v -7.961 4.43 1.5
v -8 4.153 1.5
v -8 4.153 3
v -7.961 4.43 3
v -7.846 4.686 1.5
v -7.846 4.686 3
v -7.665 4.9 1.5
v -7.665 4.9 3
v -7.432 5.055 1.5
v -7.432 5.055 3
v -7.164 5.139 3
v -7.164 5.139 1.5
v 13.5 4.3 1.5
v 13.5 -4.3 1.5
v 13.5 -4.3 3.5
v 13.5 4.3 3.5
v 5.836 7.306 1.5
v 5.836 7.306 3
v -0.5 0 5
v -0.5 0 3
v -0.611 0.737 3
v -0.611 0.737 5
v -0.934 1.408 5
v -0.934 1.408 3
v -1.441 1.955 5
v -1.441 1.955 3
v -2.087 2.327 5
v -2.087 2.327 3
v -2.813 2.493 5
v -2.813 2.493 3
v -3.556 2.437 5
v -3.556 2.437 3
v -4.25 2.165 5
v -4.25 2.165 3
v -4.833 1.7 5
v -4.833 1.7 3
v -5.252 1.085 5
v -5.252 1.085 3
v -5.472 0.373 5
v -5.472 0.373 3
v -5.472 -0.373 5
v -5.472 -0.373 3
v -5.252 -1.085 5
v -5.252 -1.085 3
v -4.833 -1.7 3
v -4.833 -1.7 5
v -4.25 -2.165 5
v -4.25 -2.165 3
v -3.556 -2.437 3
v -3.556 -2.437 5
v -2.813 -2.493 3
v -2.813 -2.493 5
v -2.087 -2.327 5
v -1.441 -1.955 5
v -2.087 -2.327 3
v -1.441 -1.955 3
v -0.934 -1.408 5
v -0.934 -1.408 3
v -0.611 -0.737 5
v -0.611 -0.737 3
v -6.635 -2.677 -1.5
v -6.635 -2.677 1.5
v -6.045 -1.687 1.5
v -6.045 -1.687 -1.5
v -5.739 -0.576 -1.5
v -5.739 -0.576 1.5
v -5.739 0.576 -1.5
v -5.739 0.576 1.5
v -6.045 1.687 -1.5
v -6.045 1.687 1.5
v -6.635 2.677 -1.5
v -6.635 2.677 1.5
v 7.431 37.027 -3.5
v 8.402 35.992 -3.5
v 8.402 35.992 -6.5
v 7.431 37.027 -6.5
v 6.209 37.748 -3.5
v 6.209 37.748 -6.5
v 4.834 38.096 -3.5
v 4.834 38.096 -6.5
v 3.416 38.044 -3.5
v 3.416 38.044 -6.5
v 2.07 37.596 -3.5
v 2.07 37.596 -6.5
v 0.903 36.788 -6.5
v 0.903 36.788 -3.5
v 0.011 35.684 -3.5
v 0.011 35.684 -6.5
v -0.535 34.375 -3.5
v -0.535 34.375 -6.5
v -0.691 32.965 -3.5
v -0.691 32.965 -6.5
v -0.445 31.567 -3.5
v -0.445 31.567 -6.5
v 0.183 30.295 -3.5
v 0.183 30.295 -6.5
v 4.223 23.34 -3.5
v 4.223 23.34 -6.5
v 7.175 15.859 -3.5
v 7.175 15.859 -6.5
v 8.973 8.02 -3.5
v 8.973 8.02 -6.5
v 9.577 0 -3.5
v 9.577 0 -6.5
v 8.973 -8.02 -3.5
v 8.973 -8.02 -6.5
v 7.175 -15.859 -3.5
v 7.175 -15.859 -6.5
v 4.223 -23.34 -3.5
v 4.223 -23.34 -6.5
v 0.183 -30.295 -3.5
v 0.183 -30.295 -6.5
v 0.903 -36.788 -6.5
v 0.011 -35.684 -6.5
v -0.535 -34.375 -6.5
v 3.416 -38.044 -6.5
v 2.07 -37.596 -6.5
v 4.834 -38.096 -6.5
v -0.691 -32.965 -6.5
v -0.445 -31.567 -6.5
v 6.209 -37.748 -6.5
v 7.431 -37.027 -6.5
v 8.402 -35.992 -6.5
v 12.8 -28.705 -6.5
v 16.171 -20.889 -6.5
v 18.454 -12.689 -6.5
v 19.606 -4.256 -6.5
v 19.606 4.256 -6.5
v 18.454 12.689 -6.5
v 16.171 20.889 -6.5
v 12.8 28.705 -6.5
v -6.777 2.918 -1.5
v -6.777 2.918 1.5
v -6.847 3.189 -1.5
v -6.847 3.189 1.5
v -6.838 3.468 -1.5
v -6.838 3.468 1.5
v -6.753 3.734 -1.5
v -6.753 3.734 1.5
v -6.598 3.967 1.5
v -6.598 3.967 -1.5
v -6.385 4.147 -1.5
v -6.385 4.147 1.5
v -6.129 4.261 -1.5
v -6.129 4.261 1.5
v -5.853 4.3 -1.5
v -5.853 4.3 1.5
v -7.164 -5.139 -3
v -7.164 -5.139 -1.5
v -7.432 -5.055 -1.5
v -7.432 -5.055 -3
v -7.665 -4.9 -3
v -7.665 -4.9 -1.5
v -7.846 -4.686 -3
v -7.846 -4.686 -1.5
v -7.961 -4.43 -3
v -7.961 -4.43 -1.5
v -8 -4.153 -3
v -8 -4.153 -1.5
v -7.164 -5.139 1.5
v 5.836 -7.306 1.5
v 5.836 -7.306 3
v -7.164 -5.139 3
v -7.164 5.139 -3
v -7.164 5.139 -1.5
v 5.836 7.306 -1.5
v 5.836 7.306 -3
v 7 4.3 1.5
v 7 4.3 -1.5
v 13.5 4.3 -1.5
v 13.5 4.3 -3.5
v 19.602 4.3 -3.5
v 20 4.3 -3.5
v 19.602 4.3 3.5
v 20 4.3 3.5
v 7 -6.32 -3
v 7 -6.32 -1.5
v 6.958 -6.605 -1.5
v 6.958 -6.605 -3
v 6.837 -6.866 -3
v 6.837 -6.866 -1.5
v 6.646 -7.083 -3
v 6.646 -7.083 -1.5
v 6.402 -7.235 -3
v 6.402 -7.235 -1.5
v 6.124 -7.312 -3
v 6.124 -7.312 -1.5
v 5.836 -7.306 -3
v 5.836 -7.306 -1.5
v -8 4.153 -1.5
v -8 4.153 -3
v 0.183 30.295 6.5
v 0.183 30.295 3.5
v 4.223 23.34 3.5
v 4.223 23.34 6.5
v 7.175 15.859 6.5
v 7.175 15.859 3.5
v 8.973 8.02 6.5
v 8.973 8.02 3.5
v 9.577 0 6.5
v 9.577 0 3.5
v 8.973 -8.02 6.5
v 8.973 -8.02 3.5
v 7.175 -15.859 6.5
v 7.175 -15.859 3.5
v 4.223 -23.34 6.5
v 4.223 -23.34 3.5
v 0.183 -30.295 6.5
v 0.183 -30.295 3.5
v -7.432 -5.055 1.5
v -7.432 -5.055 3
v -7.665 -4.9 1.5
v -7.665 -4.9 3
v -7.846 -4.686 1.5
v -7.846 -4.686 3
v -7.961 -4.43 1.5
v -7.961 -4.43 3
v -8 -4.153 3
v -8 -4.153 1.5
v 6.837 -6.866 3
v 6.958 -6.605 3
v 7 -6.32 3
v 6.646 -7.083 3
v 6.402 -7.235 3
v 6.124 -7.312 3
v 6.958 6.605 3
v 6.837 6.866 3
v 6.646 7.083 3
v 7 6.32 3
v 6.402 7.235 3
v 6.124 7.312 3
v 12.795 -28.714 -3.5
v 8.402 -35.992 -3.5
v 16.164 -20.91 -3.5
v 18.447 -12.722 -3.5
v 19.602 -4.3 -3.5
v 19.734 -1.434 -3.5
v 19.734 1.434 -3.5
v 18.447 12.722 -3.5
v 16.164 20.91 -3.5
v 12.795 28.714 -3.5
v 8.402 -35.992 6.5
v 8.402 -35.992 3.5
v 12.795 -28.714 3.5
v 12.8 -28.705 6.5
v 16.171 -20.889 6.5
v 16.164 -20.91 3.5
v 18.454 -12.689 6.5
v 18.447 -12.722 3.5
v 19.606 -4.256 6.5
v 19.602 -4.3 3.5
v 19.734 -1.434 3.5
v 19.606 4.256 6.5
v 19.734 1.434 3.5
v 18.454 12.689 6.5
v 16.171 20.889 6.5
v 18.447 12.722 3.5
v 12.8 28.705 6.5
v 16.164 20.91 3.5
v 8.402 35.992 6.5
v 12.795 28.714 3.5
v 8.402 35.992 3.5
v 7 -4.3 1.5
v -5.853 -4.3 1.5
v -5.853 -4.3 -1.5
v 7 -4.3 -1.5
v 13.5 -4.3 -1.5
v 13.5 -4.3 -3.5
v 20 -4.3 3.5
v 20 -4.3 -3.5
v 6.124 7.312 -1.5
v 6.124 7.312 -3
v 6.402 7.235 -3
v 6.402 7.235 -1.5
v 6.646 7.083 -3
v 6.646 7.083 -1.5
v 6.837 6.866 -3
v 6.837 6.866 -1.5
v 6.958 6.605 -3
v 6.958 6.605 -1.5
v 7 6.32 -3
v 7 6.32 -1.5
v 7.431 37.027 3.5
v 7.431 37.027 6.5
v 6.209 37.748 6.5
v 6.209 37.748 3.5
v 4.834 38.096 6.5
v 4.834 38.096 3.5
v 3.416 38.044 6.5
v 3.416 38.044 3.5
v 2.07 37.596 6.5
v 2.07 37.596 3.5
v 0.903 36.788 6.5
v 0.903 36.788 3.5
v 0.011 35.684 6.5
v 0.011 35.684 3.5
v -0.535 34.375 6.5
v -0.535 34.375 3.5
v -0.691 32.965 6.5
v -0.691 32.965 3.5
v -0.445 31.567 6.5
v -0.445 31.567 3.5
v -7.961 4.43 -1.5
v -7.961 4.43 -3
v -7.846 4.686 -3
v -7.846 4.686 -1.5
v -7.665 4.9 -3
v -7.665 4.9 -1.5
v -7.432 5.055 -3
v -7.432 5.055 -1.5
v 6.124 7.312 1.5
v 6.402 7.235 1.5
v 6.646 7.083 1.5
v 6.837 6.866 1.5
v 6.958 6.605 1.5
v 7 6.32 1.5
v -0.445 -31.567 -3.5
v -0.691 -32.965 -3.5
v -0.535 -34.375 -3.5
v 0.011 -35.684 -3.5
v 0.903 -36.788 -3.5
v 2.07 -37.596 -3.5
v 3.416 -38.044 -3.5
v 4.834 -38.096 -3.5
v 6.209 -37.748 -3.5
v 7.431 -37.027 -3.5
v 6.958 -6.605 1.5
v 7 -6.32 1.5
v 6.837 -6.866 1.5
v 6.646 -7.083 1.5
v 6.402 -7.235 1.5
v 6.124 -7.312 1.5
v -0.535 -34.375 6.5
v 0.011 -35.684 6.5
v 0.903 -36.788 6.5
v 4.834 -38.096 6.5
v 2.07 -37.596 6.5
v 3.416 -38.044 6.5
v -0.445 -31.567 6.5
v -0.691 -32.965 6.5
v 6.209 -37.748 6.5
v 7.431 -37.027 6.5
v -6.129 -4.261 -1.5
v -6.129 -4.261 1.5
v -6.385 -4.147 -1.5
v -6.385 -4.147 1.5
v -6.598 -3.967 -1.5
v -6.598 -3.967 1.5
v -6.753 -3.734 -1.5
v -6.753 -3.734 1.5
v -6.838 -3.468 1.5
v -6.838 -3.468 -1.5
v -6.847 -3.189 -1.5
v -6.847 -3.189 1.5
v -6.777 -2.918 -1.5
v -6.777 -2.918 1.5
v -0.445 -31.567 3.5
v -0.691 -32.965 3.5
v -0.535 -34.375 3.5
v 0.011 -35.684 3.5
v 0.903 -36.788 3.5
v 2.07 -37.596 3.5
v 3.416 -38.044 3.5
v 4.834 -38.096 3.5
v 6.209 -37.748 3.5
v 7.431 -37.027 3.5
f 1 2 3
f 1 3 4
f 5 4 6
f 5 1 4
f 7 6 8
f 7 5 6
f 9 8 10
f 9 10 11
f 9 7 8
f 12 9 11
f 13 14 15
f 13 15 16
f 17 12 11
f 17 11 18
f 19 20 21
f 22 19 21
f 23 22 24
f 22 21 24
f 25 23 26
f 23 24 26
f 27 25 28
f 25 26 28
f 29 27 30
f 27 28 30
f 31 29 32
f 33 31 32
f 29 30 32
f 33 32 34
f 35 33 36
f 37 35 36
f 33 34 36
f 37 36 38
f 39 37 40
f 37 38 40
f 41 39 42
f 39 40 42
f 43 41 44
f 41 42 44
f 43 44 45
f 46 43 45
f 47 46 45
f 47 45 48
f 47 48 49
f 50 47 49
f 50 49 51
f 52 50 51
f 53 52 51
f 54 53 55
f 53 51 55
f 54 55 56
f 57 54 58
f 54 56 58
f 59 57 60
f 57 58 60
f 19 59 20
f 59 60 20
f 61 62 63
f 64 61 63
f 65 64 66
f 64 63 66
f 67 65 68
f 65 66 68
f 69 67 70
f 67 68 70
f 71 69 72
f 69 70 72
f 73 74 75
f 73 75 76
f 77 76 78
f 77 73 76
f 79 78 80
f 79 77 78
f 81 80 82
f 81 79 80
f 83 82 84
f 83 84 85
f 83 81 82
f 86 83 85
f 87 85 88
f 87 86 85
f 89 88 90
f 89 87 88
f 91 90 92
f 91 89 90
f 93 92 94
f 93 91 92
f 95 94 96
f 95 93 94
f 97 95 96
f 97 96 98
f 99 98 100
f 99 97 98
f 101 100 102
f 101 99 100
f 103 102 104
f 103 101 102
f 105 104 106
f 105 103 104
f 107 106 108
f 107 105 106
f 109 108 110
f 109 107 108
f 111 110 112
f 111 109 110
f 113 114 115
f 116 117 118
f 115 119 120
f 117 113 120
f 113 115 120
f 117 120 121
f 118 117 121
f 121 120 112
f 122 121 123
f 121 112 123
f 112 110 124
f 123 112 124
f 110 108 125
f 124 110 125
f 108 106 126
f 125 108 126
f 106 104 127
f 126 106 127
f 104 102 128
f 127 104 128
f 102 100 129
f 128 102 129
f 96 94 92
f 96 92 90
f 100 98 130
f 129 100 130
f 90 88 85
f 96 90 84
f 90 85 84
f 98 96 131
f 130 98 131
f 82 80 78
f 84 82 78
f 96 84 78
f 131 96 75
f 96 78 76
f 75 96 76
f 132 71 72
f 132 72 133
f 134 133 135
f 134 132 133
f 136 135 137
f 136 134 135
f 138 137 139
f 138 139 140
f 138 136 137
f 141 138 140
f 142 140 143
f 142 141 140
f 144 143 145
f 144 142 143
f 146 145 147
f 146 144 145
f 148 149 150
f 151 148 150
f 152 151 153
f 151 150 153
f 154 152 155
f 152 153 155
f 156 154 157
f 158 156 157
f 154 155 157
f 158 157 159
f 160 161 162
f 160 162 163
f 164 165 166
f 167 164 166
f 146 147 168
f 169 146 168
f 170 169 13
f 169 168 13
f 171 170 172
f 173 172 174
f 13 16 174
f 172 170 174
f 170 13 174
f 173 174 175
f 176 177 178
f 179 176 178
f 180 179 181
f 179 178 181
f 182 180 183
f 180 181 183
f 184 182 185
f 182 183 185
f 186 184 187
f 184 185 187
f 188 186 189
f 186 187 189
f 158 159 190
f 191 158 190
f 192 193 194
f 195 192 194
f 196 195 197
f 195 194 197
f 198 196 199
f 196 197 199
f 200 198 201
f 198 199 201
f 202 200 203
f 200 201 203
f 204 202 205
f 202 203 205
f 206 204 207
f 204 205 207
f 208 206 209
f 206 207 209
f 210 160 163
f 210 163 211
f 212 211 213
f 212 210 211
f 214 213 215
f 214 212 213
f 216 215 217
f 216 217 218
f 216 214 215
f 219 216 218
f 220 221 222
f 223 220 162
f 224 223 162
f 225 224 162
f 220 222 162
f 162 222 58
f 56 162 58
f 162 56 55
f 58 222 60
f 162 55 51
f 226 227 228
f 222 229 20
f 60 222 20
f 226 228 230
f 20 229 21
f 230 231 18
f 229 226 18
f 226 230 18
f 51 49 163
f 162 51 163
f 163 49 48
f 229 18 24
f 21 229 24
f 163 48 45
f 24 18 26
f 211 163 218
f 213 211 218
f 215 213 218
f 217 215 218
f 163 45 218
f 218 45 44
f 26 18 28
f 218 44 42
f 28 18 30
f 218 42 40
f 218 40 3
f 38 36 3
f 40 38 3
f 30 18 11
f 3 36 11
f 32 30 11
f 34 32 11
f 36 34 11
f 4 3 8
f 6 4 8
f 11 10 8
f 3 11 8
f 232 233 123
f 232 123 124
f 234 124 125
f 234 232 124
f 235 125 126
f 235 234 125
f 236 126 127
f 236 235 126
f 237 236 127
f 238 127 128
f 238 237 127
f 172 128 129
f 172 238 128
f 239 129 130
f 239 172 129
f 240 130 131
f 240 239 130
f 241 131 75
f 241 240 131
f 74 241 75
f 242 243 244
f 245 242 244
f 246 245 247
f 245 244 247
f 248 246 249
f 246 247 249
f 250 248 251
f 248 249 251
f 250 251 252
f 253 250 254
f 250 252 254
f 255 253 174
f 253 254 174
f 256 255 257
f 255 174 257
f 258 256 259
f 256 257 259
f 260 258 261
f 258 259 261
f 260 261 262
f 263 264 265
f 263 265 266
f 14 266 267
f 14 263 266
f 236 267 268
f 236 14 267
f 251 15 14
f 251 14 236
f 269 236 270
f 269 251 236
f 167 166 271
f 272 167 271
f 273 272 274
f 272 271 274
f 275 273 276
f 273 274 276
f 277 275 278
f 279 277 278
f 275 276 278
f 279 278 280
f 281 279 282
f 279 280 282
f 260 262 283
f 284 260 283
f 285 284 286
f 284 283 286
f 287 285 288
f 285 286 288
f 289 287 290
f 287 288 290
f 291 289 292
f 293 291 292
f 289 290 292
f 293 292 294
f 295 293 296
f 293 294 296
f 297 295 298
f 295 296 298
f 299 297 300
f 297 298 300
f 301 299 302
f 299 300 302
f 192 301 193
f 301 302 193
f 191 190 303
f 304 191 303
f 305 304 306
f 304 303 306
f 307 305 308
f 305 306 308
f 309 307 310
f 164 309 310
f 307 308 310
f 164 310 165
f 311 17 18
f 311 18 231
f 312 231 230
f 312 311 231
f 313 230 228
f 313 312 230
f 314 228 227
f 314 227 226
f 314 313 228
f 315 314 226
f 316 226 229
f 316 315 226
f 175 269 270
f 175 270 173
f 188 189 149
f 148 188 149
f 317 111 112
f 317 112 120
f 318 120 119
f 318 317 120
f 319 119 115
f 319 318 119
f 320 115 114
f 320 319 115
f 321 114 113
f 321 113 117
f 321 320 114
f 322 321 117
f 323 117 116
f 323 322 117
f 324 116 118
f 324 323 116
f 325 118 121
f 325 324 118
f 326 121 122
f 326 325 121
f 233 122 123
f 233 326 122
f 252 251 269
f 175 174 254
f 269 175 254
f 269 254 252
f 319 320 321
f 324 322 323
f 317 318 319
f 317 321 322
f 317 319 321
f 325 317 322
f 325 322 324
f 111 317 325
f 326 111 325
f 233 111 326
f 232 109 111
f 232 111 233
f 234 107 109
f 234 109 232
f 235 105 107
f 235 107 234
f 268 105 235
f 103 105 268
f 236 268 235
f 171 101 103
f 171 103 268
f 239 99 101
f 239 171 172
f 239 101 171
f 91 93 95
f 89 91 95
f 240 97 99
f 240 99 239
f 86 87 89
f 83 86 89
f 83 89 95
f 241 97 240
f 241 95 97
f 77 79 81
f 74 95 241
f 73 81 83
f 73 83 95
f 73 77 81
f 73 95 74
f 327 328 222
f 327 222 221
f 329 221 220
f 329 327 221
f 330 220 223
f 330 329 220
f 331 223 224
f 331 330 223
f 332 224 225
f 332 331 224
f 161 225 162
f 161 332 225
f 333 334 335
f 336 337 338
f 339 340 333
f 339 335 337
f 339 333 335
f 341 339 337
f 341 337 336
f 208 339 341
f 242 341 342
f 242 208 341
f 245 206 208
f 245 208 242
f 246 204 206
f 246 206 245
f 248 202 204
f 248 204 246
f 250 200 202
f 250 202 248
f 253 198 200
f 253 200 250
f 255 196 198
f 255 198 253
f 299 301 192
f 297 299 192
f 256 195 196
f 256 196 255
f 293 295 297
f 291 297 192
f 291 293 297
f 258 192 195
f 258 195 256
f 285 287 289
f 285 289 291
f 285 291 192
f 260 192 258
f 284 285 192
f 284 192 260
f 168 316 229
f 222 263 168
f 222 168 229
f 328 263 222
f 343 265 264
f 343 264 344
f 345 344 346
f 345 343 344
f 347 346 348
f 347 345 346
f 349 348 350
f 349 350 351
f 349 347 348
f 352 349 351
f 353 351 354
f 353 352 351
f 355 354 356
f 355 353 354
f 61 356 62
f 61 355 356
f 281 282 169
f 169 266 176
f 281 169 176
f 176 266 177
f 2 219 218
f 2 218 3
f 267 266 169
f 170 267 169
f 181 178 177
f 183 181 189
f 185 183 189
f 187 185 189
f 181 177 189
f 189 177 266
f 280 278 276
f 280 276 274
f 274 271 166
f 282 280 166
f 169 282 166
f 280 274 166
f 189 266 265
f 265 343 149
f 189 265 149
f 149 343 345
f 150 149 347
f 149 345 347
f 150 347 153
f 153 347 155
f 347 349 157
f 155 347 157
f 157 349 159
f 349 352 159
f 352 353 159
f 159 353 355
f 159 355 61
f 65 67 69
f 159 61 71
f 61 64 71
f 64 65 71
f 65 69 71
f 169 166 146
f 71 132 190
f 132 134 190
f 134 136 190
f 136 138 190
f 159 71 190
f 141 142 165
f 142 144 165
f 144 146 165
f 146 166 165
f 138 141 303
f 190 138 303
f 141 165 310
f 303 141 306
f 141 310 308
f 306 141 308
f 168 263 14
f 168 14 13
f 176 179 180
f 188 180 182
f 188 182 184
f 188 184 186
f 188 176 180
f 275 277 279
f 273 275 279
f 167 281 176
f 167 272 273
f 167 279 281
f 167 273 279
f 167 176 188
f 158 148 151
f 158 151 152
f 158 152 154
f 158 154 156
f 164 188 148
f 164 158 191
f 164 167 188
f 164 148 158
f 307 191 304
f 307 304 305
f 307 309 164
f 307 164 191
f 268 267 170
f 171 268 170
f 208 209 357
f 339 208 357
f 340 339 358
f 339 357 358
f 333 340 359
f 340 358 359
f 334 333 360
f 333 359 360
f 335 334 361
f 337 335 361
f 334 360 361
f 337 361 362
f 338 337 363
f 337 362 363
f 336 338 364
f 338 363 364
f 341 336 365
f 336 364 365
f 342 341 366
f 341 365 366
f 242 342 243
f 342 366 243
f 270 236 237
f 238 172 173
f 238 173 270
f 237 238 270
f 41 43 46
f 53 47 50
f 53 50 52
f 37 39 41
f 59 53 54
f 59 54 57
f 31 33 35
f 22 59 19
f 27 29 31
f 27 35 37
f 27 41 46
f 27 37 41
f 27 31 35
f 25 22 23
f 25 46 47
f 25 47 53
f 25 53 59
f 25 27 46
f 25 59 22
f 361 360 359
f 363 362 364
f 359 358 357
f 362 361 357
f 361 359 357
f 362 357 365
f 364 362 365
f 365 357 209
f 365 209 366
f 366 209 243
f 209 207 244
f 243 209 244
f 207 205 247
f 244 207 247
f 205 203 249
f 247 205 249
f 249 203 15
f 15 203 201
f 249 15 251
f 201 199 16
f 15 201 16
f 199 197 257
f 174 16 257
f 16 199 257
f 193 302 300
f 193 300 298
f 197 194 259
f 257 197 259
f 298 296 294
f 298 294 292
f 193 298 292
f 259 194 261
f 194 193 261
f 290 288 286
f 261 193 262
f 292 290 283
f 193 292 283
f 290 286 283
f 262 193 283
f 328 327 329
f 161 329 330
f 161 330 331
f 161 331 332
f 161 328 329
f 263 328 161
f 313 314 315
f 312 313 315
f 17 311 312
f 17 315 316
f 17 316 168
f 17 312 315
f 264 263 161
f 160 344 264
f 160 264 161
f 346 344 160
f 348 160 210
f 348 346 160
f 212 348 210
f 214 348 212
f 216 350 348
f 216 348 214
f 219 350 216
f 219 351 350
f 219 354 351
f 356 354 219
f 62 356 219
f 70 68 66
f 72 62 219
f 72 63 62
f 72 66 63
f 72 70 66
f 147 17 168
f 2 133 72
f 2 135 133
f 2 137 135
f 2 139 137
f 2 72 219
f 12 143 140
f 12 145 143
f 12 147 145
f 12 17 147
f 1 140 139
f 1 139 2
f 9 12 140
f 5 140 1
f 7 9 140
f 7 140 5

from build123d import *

# Parameters (mm, degrees)
BOSS_EXTRUDE2_DEPTH = 1.5
BOSS_EXTRUDE4_DEPTH = 1.5
FILLET2_START       = -1.5
FILLET2_DEPTH       = 3
SKETCH4_R           = 2.5
BOSS_EXTRUDE5_DEPTH = 2
SKETCH7_W           = 3
SKETCH7_H           = 8.6
BOSS_EXTRUDE6_DEPTH = 10
SKETCH9_W           = 6.5
SKETCH9_H           = 8.6
BOSS_EXTRUDE7_DEPTH = 2
BOSS_EXTRUDE8_DEPTH = 3


with BuildPart() as part:
    # Sketch1 → Boss-Extrude2 (new body)
    with BuildSketch(Plane.XY):
        with BuildLine():
            Line((-10, 4.3), (10, 4.3))
            Line((10, 4.3), (10, -4.3))
            Line((10, -4.3), (-10, -4.3))
            ThreePointArc((-10, -4.3), (-5.7, 0), (-10, 4.3))
        make_face()
    boss_extrude2 = extrude(amount=BOSS_EXTRUDE2_DEPTH)

    # Sketch3 → Boss-Extrude4 (add)
    with BuildSketch(Plane.XY.offset(1.5)):
        with BuildLine():
            Line((7, 6.319539578), (7, -6.319539578))
            ThreePointArc((7, -6.319539578), (6.646374896, -7.082559561), (5.835601013, -7.305933502))
            Line((5.835601013, -7.305933502), (-7.164398987, -5.139266835))
            ThreePointArc((-7.164398987, -5.139266835), (-7.763019982, -4.799247808), (-8, -4.152872912))
            Line((-8, -4.152872912), (-8, 4.152872912))
            ThreePointArc((-8, 4.152872912), (-7.763019982, 4.799247808), (-7.164398987, 5.139266835))
            Line((-7.164398987, 5.139266835), (5.835601013, 7.305933502))
            ThreePointArc((5.835601013, 7.305933502), (6.646374896, 7.082559561), (7, 6.319539578))
        make_face()
    boss_extrude4 = extrude(amount=BOSS_EXTRUDE4_DEPTH)

    # Mirror1: Boss-Extrude2, Boss-Extrude4 across plane
    add(boss_extrude2.mirror(Plane(origin=(-10, 0, 0), x_dir=(1, 0, 0), z_dir=(0, 0, -1))))
    add(boss_extrude4.mirror(Plane(origin=(-10, 0, 0), x_dir=(1, 0, 0), z_dir=(0, 0, -1))))

    # Fillet2: read off the stored shape, not the designer's step
    # Fillet2 outline → Fillet2 (cut)
    with BuildSketch(Plane.XY.offset(FILLET2_START)):
        with BuildLine():
            Line((-10, -4.3), (-5.852711729, -4.3))
            ThreePointArc((-5.852711729, -4.3), (-6.753445183, -3.734372243), (-6.63521895, -2.677358491))
            ThreePointArc((-6.63521895, -2.677358491), (-8.132199356, -3.873153851), (-10, -4.3))
        make_face()
        with BuildLine():
            ThreePointArc((-10, 4.3), (-8.132199356, 3.873153851), (-6.63521895, 2.677358491))
            ThreePointArc((-6.63521895, 2.677358491), (-6.753445183, 3.734372243), (-5.852711729, 4.3))
            Line((-5.852711729, 4.3), (-10, 4.3))
        make_face()
    extrude(amount=FILLET2_DEPTH, mode=Mode.SUBTRACT)

    # Sketch4 → Boss-Extrude5 (add)
    with BuildSketch(Plane.XY.offset(3)):
        with Locations((-3, 0)):
            Circle(SKETCH4_R)
    extrude(amount=BOSS_EXTRUDE5_DEPTH)

    # Sketch7 → Boss-Extrude6 (add)
    with BuildSketch(Plane(origin=(10, 0, 0), x_dir=(0, 0, -1), z_dir=(1, 0, 0))):
        Rectangle(SKETCH7_W, SKETCH7_H)
    extrude(amount=BOSS_EXTRUDE6_DEPTH)

    # Sketch9 → Boss-Extrude7 (add)
    with BuildSketch(Plane.XY.offset(1.5)):
        with Locations((16.75, 0)):
            Rectangle(SKETCH9_W, SKETCH9_H)
    boss_extrude7 = extrude(amount=BOSS_EXTRUDE7_DEPTH)

    # Sketch10 → Boss-Extrude8 (add)
    with BuildSketch(Plane.XY.offset(3.5)):
        with BuildLine():
            ThreePointArc((8.401790779, 35.991921381), (1.457653493, 37.233388065), (0.183185936, 30.295231636))
            ThreePointArc((0.183185936, 30.295231636), (9.577117756, 0), (0.183185936, -30.295231636))
            ThreePointArc((0.183185936, -30.295231636), (1.457653493, -37.233388065), (8.401790779, -35.991921381))
            ThreePointArc((8.401790779, -35.991921381), (19.75, 0), (8.401790779, 35.991921381))
        make_face()
    boss_extrude8 = extrude(amount=BOSS_EXTRUDE8_DEPTH)

    # Mirror2: Boss-Extrude7, Boss-Extrude8 across plane
    add(boss_extrude7.mirror(Plane.XY))
    add(boss_extrude8.mirror(Plane.XY))


solid = part.part
